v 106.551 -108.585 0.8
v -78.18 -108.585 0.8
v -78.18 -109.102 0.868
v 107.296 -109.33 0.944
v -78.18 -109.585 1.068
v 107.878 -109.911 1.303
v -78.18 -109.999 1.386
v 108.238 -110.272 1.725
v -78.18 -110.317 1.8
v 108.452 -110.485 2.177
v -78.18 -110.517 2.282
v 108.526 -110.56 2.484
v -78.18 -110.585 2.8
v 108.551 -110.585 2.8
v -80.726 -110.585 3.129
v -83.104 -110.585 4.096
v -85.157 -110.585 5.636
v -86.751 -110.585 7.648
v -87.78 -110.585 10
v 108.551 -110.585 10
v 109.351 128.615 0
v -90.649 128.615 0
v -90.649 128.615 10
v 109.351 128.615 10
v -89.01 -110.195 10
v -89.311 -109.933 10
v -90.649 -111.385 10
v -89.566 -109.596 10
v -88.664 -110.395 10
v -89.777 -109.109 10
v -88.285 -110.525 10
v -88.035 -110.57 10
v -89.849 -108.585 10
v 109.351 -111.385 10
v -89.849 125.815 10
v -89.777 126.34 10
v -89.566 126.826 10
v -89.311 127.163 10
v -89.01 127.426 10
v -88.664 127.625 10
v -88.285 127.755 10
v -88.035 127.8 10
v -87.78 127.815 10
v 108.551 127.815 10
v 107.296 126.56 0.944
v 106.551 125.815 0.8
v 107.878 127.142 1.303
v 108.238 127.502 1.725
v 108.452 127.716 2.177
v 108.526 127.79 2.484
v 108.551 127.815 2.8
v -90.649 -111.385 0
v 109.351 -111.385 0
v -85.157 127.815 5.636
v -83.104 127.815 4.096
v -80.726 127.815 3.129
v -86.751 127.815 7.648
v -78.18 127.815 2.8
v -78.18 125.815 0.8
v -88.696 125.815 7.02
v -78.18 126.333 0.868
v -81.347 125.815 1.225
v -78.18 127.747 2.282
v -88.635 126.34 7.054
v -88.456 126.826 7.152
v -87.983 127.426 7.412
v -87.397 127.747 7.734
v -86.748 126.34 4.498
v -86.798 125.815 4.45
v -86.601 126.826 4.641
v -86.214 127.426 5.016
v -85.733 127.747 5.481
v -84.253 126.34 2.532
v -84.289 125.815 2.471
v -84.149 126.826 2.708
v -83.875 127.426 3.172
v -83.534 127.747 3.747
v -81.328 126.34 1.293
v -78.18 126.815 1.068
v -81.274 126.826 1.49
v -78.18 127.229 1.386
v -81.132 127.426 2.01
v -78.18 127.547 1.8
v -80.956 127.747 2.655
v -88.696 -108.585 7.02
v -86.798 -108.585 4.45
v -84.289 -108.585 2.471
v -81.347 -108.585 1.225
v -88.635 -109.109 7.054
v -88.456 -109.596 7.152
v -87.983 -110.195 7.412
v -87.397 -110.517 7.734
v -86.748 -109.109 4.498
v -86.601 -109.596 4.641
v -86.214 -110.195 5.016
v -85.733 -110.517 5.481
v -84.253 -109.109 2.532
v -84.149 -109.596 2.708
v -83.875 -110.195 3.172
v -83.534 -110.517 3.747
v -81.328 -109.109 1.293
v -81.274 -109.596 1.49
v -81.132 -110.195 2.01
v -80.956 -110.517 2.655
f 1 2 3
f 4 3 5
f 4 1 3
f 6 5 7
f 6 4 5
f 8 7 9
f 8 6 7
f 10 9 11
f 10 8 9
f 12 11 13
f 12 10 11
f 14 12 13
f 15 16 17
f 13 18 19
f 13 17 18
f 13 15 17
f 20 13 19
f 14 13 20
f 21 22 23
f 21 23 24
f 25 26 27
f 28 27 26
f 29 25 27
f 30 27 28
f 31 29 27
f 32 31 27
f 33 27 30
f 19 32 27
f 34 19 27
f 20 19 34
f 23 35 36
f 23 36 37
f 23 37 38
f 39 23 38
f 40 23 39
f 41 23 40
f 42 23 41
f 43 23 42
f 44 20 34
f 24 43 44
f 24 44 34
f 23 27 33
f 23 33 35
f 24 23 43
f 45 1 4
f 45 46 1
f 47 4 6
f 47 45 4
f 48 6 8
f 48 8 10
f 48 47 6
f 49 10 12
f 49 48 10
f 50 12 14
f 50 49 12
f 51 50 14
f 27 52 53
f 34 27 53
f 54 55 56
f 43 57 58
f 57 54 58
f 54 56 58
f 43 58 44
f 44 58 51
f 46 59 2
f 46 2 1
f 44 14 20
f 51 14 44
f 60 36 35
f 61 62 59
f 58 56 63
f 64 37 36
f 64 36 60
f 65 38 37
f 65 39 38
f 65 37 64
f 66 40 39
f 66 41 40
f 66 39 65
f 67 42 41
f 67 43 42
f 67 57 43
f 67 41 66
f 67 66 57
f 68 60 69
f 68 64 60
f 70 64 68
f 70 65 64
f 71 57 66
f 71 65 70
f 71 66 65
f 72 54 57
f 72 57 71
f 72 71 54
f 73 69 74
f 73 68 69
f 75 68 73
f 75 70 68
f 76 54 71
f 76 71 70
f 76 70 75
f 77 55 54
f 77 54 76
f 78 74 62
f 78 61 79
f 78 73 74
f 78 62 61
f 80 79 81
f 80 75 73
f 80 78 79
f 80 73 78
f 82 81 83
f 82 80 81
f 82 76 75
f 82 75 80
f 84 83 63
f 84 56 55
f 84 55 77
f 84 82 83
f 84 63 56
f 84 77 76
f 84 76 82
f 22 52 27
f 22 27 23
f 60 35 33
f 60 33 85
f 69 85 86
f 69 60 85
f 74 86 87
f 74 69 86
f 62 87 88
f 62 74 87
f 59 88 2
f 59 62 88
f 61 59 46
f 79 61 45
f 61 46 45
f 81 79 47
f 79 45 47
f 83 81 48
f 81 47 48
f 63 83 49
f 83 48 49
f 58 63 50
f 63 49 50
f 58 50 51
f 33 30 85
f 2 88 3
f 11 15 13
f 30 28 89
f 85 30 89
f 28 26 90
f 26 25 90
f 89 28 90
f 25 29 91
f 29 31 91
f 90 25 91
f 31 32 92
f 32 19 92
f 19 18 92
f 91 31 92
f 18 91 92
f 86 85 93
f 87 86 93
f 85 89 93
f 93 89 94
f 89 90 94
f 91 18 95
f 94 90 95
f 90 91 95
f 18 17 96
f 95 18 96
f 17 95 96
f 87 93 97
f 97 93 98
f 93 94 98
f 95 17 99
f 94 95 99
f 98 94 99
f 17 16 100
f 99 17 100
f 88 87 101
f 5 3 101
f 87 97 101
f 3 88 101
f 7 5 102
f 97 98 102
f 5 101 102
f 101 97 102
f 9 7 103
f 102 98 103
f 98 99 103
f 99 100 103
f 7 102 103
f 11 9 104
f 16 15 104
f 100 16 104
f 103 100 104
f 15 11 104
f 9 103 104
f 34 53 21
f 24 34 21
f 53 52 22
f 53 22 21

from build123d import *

# Parameters (mm, degrees)
F0_W        = 200
F0_H        = 240
F1_DEPTH    = 10
F2_T        = -0.8
F3_T1_DEPTH = 238.4
F4_R        = 2


# Not quite as in the source:
# - a fillet or chamfer that OpenCascade refuses, or shapes differently, is made with other operations: its cross-section is extruded or revolved along the edge and cut away or added


with BuildPart() as f1:
    # F0 (on Top) → F1 (new body)
    with BuildSketch(Plane.XY):
        with Locations((9.3512600348, 8.6151771247)):
            Rectangle(F0_W, F0_H)
    extrude(amount=F1_DEPTH)

    # F2
    f2_openings = [f1.faces().sort_by_distance(p)[0] for p in [
        (9.35126, 8.615177, 10),
    ]]
    offset(amount=F2_T, openings=f2_openings)

    # F3: fillet of radius 12 on 1 edges, made by hand

    # F3_s2 → F3_t1 (join)
    with BuildSketch(Plane.XZ.offset(-127.8151771247)):
        with BuildLine():
            ThreePointArc((-89.8487399652, 10), (-85.609648497, 3.3766248085), (-78.1799782486, 0.8))
            Line((-78.1799782486, 0.8), (-89.8487399652, 0.8))
            Line((-89.8487399652, 0.8), (-89.8487399652, 10))
        make_face()
    extrude(amount=F3_T1_DEPTH)

    # F4
    f4_edges = [f1.edges().sort_by_distance(p)[0] for p in [
        (15.185641, 127.815177, 0.8),
        (15.185641, -110.584823, 0.8),
        (108.55126, 8.615177, 0.8),
        (-85.609648, 127.815177, 3.376625),
        (-85.609648, -110.584823, 3.376625),
    ]]
    fillet(f4_edges, radius=F4_R)


solid = f1.part
